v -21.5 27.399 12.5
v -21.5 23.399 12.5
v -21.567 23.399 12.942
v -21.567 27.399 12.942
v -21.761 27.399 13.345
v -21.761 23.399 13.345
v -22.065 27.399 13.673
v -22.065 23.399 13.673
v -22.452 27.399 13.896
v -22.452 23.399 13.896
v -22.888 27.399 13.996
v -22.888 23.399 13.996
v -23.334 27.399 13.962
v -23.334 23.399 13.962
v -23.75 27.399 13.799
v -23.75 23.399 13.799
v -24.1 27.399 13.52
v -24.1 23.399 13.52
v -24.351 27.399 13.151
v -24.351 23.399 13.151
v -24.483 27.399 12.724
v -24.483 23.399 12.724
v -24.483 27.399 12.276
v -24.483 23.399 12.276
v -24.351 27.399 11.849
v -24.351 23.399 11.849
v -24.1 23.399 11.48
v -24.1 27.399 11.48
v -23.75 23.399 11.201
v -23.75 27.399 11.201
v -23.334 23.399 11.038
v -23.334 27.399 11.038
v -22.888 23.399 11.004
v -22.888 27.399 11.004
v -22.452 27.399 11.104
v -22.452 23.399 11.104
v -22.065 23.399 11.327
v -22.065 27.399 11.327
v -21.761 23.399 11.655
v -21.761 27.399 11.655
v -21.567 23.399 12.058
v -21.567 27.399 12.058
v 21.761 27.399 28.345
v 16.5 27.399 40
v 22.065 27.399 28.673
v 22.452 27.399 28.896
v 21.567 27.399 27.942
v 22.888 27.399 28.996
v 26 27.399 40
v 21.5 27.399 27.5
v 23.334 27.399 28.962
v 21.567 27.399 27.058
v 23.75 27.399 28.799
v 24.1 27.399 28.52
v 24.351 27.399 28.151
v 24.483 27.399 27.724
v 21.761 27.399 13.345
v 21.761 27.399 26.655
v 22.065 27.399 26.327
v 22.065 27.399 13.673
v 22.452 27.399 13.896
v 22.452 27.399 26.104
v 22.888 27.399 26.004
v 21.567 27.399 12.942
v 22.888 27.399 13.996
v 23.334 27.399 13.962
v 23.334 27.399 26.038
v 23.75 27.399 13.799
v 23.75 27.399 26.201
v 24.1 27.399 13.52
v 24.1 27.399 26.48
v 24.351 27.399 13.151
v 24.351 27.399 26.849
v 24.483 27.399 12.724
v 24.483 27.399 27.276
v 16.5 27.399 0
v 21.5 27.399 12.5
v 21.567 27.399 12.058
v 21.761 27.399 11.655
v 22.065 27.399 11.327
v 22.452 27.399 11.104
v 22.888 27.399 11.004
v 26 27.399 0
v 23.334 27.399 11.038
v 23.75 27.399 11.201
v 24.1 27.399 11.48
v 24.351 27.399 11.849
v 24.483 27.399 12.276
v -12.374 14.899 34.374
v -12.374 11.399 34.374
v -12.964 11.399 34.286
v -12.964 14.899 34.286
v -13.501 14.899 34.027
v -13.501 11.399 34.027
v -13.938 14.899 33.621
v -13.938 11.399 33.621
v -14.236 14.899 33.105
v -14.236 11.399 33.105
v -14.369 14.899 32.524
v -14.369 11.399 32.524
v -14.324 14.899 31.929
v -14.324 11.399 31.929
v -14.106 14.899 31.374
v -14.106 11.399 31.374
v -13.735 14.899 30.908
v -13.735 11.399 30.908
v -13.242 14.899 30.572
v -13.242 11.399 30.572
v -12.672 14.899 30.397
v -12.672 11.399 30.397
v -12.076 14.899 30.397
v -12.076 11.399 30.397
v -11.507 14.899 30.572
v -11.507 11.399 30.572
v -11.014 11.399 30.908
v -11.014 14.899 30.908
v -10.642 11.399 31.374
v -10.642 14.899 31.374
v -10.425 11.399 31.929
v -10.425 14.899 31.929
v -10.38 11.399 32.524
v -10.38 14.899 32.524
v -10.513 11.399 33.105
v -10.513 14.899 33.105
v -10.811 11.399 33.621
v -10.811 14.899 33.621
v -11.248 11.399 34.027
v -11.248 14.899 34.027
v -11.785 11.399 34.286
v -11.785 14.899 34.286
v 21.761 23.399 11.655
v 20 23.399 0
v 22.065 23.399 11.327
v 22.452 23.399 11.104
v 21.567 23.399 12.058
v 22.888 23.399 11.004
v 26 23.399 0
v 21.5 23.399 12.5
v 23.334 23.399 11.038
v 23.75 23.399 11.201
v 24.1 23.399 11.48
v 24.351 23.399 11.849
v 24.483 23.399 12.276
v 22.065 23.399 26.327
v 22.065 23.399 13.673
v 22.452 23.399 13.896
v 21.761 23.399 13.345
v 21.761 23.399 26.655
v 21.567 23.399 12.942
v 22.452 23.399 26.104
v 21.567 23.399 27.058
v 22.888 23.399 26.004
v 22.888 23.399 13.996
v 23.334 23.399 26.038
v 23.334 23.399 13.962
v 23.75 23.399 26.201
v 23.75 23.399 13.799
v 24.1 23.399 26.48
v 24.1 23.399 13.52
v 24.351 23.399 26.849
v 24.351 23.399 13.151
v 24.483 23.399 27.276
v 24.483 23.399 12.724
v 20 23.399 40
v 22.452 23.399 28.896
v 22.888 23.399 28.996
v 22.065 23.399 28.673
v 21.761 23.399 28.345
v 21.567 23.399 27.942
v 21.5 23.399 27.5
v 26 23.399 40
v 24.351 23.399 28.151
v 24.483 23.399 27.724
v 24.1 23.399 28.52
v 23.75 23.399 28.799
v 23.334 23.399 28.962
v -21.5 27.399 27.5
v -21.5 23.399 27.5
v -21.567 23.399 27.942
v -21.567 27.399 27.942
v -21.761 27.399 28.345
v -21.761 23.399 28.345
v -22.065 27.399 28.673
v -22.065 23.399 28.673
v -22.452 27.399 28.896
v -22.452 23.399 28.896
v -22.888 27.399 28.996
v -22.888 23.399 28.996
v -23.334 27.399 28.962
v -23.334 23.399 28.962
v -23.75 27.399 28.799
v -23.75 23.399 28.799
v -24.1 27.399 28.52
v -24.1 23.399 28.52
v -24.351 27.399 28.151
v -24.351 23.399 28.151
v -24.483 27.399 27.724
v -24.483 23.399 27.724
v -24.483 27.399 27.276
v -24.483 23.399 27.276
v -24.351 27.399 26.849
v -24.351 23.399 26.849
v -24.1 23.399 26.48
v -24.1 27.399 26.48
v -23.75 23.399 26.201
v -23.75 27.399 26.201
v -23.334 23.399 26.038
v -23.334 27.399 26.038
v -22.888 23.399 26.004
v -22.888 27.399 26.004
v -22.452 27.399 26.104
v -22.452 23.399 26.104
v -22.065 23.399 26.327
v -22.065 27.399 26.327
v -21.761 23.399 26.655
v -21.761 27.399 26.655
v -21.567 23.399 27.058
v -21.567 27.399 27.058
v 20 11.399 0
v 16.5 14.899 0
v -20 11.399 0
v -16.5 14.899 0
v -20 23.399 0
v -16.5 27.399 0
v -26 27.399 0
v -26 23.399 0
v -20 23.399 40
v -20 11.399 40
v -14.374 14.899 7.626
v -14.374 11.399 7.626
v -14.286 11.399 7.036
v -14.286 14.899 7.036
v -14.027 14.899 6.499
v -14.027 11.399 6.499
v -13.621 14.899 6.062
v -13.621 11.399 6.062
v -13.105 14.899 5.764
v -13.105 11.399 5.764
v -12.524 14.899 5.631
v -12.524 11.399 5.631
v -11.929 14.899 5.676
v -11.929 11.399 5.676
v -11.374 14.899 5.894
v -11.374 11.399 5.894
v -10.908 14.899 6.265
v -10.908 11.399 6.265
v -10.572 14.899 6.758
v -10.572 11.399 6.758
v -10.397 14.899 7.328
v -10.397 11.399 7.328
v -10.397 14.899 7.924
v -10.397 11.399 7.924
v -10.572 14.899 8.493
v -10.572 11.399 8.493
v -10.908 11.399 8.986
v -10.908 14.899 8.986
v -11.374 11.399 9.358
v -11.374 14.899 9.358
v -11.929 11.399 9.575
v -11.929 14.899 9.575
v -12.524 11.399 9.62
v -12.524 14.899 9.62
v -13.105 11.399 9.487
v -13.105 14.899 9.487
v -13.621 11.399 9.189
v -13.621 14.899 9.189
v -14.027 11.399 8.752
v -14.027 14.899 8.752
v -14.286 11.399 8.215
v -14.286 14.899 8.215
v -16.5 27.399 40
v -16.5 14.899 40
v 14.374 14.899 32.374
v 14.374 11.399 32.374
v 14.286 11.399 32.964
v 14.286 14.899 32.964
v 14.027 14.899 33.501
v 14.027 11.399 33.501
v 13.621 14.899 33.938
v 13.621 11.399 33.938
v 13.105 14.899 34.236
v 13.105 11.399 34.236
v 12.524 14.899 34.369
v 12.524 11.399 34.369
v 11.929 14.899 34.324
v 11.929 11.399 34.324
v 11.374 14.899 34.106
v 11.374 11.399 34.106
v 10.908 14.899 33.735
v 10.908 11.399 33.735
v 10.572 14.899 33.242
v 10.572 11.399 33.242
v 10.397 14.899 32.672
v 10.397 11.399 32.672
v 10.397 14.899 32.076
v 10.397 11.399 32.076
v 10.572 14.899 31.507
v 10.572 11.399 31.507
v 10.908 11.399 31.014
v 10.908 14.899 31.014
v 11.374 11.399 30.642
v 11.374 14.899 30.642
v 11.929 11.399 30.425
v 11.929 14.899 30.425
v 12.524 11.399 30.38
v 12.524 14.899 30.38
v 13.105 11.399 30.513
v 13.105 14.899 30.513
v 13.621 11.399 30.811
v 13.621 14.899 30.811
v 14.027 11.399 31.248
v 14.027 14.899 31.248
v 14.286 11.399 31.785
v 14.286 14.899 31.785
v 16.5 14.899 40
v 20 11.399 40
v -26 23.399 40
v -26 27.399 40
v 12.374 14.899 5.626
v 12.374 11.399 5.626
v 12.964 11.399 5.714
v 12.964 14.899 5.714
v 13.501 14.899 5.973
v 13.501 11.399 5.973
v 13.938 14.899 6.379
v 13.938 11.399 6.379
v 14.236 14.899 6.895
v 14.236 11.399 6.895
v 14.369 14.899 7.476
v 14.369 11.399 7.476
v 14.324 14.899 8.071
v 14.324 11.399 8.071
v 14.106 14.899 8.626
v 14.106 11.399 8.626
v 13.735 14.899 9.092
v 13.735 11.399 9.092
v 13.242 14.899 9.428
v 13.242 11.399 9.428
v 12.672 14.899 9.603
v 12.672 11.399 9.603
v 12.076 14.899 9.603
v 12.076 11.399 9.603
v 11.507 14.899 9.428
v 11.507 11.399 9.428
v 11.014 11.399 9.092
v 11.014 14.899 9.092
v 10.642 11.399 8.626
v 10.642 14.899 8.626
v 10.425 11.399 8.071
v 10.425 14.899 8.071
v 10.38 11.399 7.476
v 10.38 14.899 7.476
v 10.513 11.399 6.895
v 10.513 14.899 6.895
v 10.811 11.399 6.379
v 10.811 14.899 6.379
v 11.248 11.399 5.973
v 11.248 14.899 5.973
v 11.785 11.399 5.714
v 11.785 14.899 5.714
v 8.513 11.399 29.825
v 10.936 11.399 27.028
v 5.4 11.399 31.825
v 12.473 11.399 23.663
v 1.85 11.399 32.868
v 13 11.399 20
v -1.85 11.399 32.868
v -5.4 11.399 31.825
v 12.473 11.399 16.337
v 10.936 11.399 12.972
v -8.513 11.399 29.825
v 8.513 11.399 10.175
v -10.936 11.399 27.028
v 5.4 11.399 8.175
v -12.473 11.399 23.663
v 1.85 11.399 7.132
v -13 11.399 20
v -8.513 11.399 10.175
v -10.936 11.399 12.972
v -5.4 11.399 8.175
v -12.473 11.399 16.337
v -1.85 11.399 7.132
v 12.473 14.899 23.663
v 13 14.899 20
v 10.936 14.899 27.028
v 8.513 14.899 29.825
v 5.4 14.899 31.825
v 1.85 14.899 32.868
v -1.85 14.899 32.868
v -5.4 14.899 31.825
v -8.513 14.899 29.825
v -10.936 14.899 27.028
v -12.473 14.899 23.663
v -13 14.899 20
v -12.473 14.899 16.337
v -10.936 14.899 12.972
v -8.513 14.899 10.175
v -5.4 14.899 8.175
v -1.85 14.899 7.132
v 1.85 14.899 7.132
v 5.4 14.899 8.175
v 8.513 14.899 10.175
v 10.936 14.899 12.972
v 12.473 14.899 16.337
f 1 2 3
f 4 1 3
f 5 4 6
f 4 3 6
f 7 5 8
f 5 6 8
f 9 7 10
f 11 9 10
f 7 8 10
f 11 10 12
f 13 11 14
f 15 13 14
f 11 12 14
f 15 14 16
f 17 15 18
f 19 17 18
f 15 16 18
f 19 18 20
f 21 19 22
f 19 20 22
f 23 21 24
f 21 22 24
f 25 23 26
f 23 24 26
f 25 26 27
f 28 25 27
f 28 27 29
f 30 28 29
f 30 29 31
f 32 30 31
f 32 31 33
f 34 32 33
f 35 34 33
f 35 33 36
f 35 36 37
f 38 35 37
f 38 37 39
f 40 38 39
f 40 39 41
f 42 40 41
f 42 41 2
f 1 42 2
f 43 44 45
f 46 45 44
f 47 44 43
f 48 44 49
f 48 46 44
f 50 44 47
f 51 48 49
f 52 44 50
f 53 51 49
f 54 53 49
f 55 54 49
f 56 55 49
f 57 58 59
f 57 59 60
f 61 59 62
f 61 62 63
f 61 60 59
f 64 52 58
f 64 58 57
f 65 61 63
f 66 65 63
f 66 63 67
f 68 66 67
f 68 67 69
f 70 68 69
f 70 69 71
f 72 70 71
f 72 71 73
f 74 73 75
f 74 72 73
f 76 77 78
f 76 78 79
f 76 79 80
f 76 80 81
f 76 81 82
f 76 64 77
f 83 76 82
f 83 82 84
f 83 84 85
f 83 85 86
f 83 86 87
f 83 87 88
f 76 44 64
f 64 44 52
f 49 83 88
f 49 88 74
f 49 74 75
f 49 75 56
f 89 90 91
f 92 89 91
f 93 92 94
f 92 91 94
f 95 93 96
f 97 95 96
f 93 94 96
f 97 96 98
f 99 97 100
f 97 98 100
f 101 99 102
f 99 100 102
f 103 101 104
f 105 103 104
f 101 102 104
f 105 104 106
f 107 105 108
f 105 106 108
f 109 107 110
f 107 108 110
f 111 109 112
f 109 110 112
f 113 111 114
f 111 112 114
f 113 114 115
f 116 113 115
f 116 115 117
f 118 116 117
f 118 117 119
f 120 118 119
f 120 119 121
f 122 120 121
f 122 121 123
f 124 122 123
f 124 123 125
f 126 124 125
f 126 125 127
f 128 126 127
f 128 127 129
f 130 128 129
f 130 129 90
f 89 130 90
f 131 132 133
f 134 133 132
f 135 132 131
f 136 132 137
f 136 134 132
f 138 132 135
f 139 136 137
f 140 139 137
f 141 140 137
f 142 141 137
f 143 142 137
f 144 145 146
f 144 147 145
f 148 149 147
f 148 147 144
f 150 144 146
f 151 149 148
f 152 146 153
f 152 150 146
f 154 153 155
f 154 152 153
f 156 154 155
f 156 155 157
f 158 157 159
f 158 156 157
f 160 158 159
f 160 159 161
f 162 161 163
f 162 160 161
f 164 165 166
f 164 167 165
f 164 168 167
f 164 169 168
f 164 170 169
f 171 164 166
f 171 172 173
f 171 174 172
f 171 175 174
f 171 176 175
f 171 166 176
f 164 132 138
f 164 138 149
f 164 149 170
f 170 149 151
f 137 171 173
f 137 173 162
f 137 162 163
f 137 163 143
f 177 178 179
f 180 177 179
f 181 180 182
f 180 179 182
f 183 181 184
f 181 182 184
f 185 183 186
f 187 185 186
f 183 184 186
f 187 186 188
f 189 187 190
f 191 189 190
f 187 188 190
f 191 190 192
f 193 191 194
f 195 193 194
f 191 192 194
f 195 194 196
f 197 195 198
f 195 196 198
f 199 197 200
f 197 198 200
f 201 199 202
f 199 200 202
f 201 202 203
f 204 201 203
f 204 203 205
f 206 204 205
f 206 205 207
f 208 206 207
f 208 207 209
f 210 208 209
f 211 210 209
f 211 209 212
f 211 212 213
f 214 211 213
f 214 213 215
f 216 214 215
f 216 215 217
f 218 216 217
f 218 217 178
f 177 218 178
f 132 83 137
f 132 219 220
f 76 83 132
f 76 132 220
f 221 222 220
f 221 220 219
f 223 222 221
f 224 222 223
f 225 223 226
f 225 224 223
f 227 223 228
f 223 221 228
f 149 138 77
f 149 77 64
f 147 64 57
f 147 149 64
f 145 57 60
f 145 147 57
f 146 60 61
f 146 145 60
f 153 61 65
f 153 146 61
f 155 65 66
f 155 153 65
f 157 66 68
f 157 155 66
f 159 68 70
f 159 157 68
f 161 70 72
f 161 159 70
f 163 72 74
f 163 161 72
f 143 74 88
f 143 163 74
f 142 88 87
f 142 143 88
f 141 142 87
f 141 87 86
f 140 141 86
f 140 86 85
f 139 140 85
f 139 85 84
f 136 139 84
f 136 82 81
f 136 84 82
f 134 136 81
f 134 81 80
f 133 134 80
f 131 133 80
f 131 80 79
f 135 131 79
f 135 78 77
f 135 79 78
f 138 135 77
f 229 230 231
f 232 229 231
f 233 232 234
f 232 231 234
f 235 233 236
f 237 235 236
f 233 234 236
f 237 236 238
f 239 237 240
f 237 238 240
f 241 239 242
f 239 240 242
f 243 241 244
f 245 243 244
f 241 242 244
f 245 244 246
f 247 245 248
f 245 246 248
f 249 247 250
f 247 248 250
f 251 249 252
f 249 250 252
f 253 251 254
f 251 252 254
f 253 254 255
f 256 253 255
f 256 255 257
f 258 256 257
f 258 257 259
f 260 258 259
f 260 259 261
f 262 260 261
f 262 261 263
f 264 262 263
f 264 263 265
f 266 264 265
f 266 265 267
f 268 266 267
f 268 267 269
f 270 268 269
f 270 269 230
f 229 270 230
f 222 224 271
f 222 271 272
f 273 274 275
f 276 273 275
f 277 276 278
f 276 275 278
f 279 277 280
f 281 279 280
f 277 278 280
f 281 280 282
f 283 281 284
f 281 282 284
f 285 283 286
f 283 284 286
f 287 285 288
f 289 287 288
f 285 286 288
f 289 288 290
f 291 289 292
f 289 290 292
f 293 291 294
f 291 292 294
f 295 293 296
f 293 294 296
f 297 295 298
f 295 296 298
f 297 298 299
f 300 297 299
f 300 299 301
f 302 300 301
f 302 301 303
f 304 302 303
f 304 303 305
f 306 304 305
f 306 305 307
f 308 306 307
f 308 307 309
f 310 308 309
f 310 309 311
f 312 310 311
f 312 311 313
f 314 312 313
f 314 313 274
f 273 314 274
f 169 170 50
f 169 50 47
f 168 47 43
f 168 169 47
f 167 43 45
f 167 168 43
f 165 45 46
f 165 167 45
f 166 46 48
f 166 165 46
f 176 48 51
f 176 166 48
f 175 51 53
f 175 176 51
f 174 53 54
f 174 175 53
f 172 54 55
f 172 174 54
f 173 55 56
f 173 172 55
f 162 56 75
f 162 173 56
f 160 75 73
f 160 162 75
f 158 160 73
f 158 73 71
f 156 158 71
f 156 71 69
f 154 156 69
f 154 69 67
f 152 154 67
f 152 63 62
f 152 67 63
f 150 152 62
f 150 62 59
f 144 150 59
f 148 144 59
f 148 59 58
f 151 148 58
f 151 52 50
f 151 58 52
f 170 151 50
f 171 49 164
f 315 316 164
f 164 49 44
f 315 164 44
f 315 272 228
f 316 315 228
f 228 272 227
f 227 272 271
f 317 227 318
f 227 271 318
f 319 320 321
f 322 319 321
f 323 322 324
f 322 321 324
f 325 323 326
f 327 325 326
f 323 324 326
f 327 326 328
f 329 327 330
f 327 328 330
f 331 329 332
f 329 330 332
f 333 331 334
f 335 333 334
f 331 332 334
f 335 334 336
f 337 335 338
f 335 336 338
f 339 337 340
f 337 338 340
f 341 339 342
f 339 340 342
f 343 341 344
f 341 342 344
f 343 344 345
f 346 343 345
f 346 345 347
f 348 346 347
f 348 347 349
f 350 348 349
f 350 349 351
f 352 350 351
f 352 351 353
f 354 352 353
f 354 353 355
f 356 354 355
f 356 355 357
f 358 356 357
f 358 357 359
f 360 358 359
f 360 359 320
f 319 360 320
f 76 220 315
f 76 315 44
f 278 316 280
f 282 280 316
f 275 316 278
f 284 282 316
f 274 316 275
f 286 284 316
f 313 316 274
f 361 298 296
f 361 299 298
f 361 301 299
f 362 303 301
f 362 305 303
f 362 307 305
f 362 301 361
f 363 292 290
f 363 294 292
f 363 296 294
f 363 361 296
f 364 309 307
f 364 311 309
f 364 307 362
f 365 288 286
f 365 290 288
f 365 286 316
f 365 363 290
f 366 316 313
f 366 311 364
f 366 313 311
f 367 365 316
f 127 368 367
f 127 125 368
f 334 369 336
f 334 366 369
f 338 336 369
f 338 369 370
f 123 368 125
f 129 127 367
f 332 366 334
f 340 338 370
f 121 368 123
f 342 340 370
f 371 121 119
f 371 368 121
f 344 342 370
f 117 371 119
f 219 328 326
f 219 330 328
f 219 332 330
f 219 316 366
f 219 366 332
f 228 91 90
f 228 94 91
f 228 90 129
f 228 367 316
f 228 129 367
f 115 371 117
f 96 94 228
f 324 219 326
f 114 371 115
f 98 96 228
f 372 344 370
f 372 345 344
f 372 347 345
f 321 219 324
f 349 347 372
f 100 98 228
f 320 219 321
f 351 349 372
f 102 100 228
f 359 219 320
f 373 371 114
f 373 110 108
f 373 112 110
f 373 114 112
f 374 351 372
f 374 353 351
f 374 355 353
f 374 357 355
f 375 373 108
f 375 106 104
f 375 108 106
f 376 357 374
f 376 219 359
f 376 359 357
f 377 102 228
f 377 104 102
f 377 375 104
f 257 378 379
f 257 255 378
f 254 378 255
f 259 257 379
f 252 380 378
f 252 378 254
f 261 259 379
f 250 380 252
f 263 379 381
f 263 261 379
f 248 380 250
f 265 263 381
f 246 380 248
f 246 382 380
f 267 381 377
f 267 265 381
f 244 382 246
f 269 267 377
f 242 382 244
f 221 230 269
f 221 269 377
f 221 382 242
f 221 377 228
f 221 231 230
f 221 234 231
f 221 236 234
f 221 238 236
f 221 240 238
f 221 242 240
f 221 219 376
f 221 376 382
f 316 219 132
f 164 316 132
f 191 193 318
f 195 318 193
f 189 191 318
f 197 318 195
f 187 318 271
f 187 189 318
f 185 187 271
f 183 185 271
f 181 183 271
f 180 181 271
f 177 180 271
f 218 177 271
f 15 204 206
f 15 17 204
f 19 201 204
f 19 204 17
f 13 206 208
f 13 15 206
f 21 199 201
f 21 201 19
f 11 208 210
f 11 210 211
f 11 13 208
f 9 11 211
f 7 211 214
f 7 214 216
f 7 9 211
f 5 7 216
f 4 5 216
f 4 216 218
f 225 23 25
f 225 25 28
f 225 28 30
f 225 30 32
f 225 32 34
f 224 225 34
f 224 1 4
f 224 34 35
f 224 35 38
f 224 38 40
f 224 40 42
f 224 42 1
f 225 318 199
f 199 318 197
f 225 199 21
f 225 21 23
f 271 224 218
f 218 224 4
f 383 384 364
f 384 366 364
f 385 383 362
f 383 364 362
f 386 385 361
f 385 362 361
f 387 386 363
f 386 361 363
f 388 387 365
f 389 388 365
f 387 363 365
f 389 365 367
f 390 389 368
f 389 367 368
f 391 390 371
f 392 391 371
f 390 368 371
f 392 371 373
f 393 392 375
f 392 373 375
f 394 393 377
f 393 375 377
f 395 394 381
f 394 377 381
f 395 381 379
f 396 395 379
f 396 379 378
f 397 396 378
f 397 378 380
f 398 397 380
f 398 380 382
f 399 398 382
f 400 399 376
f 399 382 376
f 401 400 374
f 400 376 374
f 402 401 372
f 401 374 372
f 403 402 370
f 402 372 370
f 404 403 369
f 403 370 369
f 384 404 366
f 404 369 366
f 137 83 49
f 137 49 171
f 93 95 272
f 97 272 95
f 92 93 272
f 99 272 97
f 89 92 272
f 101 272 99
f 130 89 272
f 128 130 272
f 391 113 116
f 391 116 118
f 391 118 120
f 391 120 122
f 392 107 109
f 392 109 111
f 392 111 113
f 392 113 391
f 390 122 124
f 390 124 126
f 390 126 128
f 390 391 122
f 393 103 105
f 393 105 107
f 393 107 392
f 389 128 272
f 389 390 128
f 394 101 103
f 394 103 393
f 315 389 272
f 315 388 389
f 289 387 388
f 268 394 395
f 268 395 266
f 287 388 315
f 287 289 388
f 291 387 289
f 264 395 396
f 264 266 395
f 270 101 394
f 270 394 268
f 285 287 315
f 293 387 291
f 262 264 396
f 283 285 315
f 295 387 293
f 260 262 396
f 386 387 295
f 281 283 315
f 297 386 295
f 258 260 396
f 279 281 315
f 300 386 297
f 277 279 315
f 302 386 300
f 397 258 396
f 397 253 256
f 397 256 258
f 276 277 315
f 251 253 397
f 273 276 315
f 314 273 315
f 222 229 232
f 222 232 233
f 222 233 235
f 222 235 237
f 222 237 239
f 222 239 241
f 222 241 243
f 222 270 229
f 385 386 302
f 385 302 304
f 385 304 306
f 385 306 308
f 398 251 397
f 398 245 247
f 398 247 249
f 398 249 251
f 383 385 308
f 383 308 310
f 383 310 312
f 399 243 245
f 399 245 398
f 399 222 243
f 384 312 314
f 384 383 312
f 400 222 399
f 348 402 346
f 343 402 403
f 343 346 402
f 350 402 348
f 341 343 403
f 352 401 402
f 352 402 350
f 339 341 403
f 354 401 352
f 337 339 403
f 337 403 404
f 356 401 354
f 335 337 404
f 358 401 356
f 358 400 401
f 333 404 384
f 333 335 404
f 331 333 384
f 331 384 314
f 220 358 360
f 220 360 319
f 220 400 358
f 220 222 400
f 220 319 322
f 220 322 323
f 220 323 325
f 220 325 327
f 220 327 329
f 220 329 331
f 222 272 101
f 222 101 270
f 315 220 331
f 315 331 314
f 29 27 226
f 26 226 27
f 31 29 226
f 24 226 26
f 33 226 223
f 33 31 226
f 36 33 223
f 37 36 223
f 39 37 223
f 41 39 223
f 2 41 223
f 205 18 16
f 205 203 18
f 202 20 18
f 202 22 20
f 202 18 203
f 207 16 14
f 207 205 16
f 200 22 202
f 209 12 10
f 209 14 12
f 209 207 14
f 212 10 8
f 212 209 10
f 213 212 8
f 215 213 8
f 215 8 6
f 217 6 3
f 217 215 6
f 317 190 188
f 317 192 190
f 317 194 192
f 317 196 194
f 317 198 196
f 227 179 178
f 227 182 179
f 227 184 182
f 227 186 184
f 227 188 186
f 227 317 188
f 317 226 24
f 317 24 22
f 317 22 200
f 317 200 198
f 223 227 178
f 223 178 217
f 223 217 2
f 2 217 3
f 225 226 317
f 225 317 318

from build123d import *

# Parameters (mm, degrees)
EXTRUDE_1_DEPTH          = 40
SKETCH_2_R               = 13
CUT_EXTRUDE_1_DEPTH      = 1.5
SKETCH_3_R               = 13
CUT_EXTRUDE_2_DEPTH      = 15.5
SKETCH_4_R               = 2
CUT_EXTRUDE_3_DEPTH      = 5
PATTERN_CIRCULAR_1_COUNT = 4
SKETCH_5_R               = 1.5
CUT_EXTRUDE_4_DEPTH      = 7
SKETCH_6_W               = 33
SKETCH_6_H               = 40
CUT_EXTRUDE_5_DEPTH      = 1.5
SKETCH_7_W               = 6
SKETCH_7_H               = 40
CUT_EXTRUDE_6_DEPTH      = 2


with BuildPart() as part:
    # 草图1 → 凸台-拉伸1 (new body)
    with BuildSketch(Plane.XY):
        Polygon((-16.5, 27.398785639), (-16.5, 16.398785639), (16.5, 16.398785639), (16.5, 27.398785639), (26, 27.398785639), (26, 21.398785639), (20, 21.398785639), (20, 16.398785639), (20, 11.398785639), (-20, 11.398785639), (-20, 21.398785639), (-26, 21.398785639), (-26, 27.398785639), align=None)
    extrude(amount=EXTRUDE_1_DEPTH)

    # 草图2 → 切除-拉伸1 (cut)
    with BuildSketch(Plane.XZ.offset(-11.398785639)):
        with Locations((0, 20)):
            Circle(SKETCH_2_R)
    extrude(amount=-CUT_EXTRUDE_1_DEPTH, mode=Mode.SUBTRACT)

    # 草图3 → 切除-拉伸2 (cut, through all)
    with BuildSketch(Plane.XZ.offset(-12.898785639)):
        with Locations((0, 20)):
            Circle(SKETCH_3_R)
    extrude(amount=-CUT_EXTRUDE_2_DEPTH, mode=Mode.SUBTRACT)

    # 草图4 → 切除-拉伸3 (cut)
    with BuildSketch(Plane.XZ.offset(-11.398785639)):
        with Locations((12.374368671, 32.374368671)):
            Circle(SKETCH_4_R)
    cut_extrude_3 = extrude(amount=-CUT_EXTRUDE_3_DEPTH, mode=Mode.SUBTRACT)

    # 阵列(圆周)1: 切除-拉伸3 ×4 about axis
    pattern_circular_1_axis = Axis((0, 0, 20), (0, 1, 0))
    for i in range(1, PATTERN_CIRCULAR_1_COUNT):
        add(cut_extrude_3.rotate(pattern_circular_1_axis, i * 360 / PATTERN_CIRCULAR_1_COUNT), mode=Mode.SUBTRACT)

    # 草图5 → 切除-拉伸4 (cut, through all)
    with BuildSketch(Plane.XZ.offset(-21.398785639)):
        with Locations((-23, 27.5)):
            Circle(SKETCH_5_R)
        with Locations((-23, 12.5)):
            Circle(SKETCH_5_R)
    cut_extrude_4 = extrude(amount=-CUT_EXTRUDE_4_DEPTH, mode=Mode.SUBTRACT)

    # 镜向1: 切除-拉伸4 across plane
    add(cut_extrude_4.mirror(Plane.ZY), mode=Mode.SUBTRACT)

    # 草图6 → 切除-拉伸5 (cut)
    with BuildSketch(Plane(origin=(0, 16.398785639, 0), x_dir=(1, 0, 0), z_dir=(0, 1, 0))):
        with Locations((0, -20)):
            Rectangle(SKETCH_6_W, SKETCH_6_H)
    extrude(amount=-CUT_EXTRUDE_5_DEPTH, mode=Mode.SUBTRACT)

    # 草图7 → 切除-拉伸6 (cut)
    with BuildSketch(Plane.XZ.offset(-21.398785639)):
        with Locations((-23, 20)):
            Rectangle(SKETCH_7_W, SKETCH_7_H)
        with Locations((23, 20)):
            Rectangle(SKETCH_7_W, SKETCH_7_H)
    extrude(amount=-CUT_EXTRUDE_6_DEPTH, mode=Mode.SUBTRACT)


solid = part.part
